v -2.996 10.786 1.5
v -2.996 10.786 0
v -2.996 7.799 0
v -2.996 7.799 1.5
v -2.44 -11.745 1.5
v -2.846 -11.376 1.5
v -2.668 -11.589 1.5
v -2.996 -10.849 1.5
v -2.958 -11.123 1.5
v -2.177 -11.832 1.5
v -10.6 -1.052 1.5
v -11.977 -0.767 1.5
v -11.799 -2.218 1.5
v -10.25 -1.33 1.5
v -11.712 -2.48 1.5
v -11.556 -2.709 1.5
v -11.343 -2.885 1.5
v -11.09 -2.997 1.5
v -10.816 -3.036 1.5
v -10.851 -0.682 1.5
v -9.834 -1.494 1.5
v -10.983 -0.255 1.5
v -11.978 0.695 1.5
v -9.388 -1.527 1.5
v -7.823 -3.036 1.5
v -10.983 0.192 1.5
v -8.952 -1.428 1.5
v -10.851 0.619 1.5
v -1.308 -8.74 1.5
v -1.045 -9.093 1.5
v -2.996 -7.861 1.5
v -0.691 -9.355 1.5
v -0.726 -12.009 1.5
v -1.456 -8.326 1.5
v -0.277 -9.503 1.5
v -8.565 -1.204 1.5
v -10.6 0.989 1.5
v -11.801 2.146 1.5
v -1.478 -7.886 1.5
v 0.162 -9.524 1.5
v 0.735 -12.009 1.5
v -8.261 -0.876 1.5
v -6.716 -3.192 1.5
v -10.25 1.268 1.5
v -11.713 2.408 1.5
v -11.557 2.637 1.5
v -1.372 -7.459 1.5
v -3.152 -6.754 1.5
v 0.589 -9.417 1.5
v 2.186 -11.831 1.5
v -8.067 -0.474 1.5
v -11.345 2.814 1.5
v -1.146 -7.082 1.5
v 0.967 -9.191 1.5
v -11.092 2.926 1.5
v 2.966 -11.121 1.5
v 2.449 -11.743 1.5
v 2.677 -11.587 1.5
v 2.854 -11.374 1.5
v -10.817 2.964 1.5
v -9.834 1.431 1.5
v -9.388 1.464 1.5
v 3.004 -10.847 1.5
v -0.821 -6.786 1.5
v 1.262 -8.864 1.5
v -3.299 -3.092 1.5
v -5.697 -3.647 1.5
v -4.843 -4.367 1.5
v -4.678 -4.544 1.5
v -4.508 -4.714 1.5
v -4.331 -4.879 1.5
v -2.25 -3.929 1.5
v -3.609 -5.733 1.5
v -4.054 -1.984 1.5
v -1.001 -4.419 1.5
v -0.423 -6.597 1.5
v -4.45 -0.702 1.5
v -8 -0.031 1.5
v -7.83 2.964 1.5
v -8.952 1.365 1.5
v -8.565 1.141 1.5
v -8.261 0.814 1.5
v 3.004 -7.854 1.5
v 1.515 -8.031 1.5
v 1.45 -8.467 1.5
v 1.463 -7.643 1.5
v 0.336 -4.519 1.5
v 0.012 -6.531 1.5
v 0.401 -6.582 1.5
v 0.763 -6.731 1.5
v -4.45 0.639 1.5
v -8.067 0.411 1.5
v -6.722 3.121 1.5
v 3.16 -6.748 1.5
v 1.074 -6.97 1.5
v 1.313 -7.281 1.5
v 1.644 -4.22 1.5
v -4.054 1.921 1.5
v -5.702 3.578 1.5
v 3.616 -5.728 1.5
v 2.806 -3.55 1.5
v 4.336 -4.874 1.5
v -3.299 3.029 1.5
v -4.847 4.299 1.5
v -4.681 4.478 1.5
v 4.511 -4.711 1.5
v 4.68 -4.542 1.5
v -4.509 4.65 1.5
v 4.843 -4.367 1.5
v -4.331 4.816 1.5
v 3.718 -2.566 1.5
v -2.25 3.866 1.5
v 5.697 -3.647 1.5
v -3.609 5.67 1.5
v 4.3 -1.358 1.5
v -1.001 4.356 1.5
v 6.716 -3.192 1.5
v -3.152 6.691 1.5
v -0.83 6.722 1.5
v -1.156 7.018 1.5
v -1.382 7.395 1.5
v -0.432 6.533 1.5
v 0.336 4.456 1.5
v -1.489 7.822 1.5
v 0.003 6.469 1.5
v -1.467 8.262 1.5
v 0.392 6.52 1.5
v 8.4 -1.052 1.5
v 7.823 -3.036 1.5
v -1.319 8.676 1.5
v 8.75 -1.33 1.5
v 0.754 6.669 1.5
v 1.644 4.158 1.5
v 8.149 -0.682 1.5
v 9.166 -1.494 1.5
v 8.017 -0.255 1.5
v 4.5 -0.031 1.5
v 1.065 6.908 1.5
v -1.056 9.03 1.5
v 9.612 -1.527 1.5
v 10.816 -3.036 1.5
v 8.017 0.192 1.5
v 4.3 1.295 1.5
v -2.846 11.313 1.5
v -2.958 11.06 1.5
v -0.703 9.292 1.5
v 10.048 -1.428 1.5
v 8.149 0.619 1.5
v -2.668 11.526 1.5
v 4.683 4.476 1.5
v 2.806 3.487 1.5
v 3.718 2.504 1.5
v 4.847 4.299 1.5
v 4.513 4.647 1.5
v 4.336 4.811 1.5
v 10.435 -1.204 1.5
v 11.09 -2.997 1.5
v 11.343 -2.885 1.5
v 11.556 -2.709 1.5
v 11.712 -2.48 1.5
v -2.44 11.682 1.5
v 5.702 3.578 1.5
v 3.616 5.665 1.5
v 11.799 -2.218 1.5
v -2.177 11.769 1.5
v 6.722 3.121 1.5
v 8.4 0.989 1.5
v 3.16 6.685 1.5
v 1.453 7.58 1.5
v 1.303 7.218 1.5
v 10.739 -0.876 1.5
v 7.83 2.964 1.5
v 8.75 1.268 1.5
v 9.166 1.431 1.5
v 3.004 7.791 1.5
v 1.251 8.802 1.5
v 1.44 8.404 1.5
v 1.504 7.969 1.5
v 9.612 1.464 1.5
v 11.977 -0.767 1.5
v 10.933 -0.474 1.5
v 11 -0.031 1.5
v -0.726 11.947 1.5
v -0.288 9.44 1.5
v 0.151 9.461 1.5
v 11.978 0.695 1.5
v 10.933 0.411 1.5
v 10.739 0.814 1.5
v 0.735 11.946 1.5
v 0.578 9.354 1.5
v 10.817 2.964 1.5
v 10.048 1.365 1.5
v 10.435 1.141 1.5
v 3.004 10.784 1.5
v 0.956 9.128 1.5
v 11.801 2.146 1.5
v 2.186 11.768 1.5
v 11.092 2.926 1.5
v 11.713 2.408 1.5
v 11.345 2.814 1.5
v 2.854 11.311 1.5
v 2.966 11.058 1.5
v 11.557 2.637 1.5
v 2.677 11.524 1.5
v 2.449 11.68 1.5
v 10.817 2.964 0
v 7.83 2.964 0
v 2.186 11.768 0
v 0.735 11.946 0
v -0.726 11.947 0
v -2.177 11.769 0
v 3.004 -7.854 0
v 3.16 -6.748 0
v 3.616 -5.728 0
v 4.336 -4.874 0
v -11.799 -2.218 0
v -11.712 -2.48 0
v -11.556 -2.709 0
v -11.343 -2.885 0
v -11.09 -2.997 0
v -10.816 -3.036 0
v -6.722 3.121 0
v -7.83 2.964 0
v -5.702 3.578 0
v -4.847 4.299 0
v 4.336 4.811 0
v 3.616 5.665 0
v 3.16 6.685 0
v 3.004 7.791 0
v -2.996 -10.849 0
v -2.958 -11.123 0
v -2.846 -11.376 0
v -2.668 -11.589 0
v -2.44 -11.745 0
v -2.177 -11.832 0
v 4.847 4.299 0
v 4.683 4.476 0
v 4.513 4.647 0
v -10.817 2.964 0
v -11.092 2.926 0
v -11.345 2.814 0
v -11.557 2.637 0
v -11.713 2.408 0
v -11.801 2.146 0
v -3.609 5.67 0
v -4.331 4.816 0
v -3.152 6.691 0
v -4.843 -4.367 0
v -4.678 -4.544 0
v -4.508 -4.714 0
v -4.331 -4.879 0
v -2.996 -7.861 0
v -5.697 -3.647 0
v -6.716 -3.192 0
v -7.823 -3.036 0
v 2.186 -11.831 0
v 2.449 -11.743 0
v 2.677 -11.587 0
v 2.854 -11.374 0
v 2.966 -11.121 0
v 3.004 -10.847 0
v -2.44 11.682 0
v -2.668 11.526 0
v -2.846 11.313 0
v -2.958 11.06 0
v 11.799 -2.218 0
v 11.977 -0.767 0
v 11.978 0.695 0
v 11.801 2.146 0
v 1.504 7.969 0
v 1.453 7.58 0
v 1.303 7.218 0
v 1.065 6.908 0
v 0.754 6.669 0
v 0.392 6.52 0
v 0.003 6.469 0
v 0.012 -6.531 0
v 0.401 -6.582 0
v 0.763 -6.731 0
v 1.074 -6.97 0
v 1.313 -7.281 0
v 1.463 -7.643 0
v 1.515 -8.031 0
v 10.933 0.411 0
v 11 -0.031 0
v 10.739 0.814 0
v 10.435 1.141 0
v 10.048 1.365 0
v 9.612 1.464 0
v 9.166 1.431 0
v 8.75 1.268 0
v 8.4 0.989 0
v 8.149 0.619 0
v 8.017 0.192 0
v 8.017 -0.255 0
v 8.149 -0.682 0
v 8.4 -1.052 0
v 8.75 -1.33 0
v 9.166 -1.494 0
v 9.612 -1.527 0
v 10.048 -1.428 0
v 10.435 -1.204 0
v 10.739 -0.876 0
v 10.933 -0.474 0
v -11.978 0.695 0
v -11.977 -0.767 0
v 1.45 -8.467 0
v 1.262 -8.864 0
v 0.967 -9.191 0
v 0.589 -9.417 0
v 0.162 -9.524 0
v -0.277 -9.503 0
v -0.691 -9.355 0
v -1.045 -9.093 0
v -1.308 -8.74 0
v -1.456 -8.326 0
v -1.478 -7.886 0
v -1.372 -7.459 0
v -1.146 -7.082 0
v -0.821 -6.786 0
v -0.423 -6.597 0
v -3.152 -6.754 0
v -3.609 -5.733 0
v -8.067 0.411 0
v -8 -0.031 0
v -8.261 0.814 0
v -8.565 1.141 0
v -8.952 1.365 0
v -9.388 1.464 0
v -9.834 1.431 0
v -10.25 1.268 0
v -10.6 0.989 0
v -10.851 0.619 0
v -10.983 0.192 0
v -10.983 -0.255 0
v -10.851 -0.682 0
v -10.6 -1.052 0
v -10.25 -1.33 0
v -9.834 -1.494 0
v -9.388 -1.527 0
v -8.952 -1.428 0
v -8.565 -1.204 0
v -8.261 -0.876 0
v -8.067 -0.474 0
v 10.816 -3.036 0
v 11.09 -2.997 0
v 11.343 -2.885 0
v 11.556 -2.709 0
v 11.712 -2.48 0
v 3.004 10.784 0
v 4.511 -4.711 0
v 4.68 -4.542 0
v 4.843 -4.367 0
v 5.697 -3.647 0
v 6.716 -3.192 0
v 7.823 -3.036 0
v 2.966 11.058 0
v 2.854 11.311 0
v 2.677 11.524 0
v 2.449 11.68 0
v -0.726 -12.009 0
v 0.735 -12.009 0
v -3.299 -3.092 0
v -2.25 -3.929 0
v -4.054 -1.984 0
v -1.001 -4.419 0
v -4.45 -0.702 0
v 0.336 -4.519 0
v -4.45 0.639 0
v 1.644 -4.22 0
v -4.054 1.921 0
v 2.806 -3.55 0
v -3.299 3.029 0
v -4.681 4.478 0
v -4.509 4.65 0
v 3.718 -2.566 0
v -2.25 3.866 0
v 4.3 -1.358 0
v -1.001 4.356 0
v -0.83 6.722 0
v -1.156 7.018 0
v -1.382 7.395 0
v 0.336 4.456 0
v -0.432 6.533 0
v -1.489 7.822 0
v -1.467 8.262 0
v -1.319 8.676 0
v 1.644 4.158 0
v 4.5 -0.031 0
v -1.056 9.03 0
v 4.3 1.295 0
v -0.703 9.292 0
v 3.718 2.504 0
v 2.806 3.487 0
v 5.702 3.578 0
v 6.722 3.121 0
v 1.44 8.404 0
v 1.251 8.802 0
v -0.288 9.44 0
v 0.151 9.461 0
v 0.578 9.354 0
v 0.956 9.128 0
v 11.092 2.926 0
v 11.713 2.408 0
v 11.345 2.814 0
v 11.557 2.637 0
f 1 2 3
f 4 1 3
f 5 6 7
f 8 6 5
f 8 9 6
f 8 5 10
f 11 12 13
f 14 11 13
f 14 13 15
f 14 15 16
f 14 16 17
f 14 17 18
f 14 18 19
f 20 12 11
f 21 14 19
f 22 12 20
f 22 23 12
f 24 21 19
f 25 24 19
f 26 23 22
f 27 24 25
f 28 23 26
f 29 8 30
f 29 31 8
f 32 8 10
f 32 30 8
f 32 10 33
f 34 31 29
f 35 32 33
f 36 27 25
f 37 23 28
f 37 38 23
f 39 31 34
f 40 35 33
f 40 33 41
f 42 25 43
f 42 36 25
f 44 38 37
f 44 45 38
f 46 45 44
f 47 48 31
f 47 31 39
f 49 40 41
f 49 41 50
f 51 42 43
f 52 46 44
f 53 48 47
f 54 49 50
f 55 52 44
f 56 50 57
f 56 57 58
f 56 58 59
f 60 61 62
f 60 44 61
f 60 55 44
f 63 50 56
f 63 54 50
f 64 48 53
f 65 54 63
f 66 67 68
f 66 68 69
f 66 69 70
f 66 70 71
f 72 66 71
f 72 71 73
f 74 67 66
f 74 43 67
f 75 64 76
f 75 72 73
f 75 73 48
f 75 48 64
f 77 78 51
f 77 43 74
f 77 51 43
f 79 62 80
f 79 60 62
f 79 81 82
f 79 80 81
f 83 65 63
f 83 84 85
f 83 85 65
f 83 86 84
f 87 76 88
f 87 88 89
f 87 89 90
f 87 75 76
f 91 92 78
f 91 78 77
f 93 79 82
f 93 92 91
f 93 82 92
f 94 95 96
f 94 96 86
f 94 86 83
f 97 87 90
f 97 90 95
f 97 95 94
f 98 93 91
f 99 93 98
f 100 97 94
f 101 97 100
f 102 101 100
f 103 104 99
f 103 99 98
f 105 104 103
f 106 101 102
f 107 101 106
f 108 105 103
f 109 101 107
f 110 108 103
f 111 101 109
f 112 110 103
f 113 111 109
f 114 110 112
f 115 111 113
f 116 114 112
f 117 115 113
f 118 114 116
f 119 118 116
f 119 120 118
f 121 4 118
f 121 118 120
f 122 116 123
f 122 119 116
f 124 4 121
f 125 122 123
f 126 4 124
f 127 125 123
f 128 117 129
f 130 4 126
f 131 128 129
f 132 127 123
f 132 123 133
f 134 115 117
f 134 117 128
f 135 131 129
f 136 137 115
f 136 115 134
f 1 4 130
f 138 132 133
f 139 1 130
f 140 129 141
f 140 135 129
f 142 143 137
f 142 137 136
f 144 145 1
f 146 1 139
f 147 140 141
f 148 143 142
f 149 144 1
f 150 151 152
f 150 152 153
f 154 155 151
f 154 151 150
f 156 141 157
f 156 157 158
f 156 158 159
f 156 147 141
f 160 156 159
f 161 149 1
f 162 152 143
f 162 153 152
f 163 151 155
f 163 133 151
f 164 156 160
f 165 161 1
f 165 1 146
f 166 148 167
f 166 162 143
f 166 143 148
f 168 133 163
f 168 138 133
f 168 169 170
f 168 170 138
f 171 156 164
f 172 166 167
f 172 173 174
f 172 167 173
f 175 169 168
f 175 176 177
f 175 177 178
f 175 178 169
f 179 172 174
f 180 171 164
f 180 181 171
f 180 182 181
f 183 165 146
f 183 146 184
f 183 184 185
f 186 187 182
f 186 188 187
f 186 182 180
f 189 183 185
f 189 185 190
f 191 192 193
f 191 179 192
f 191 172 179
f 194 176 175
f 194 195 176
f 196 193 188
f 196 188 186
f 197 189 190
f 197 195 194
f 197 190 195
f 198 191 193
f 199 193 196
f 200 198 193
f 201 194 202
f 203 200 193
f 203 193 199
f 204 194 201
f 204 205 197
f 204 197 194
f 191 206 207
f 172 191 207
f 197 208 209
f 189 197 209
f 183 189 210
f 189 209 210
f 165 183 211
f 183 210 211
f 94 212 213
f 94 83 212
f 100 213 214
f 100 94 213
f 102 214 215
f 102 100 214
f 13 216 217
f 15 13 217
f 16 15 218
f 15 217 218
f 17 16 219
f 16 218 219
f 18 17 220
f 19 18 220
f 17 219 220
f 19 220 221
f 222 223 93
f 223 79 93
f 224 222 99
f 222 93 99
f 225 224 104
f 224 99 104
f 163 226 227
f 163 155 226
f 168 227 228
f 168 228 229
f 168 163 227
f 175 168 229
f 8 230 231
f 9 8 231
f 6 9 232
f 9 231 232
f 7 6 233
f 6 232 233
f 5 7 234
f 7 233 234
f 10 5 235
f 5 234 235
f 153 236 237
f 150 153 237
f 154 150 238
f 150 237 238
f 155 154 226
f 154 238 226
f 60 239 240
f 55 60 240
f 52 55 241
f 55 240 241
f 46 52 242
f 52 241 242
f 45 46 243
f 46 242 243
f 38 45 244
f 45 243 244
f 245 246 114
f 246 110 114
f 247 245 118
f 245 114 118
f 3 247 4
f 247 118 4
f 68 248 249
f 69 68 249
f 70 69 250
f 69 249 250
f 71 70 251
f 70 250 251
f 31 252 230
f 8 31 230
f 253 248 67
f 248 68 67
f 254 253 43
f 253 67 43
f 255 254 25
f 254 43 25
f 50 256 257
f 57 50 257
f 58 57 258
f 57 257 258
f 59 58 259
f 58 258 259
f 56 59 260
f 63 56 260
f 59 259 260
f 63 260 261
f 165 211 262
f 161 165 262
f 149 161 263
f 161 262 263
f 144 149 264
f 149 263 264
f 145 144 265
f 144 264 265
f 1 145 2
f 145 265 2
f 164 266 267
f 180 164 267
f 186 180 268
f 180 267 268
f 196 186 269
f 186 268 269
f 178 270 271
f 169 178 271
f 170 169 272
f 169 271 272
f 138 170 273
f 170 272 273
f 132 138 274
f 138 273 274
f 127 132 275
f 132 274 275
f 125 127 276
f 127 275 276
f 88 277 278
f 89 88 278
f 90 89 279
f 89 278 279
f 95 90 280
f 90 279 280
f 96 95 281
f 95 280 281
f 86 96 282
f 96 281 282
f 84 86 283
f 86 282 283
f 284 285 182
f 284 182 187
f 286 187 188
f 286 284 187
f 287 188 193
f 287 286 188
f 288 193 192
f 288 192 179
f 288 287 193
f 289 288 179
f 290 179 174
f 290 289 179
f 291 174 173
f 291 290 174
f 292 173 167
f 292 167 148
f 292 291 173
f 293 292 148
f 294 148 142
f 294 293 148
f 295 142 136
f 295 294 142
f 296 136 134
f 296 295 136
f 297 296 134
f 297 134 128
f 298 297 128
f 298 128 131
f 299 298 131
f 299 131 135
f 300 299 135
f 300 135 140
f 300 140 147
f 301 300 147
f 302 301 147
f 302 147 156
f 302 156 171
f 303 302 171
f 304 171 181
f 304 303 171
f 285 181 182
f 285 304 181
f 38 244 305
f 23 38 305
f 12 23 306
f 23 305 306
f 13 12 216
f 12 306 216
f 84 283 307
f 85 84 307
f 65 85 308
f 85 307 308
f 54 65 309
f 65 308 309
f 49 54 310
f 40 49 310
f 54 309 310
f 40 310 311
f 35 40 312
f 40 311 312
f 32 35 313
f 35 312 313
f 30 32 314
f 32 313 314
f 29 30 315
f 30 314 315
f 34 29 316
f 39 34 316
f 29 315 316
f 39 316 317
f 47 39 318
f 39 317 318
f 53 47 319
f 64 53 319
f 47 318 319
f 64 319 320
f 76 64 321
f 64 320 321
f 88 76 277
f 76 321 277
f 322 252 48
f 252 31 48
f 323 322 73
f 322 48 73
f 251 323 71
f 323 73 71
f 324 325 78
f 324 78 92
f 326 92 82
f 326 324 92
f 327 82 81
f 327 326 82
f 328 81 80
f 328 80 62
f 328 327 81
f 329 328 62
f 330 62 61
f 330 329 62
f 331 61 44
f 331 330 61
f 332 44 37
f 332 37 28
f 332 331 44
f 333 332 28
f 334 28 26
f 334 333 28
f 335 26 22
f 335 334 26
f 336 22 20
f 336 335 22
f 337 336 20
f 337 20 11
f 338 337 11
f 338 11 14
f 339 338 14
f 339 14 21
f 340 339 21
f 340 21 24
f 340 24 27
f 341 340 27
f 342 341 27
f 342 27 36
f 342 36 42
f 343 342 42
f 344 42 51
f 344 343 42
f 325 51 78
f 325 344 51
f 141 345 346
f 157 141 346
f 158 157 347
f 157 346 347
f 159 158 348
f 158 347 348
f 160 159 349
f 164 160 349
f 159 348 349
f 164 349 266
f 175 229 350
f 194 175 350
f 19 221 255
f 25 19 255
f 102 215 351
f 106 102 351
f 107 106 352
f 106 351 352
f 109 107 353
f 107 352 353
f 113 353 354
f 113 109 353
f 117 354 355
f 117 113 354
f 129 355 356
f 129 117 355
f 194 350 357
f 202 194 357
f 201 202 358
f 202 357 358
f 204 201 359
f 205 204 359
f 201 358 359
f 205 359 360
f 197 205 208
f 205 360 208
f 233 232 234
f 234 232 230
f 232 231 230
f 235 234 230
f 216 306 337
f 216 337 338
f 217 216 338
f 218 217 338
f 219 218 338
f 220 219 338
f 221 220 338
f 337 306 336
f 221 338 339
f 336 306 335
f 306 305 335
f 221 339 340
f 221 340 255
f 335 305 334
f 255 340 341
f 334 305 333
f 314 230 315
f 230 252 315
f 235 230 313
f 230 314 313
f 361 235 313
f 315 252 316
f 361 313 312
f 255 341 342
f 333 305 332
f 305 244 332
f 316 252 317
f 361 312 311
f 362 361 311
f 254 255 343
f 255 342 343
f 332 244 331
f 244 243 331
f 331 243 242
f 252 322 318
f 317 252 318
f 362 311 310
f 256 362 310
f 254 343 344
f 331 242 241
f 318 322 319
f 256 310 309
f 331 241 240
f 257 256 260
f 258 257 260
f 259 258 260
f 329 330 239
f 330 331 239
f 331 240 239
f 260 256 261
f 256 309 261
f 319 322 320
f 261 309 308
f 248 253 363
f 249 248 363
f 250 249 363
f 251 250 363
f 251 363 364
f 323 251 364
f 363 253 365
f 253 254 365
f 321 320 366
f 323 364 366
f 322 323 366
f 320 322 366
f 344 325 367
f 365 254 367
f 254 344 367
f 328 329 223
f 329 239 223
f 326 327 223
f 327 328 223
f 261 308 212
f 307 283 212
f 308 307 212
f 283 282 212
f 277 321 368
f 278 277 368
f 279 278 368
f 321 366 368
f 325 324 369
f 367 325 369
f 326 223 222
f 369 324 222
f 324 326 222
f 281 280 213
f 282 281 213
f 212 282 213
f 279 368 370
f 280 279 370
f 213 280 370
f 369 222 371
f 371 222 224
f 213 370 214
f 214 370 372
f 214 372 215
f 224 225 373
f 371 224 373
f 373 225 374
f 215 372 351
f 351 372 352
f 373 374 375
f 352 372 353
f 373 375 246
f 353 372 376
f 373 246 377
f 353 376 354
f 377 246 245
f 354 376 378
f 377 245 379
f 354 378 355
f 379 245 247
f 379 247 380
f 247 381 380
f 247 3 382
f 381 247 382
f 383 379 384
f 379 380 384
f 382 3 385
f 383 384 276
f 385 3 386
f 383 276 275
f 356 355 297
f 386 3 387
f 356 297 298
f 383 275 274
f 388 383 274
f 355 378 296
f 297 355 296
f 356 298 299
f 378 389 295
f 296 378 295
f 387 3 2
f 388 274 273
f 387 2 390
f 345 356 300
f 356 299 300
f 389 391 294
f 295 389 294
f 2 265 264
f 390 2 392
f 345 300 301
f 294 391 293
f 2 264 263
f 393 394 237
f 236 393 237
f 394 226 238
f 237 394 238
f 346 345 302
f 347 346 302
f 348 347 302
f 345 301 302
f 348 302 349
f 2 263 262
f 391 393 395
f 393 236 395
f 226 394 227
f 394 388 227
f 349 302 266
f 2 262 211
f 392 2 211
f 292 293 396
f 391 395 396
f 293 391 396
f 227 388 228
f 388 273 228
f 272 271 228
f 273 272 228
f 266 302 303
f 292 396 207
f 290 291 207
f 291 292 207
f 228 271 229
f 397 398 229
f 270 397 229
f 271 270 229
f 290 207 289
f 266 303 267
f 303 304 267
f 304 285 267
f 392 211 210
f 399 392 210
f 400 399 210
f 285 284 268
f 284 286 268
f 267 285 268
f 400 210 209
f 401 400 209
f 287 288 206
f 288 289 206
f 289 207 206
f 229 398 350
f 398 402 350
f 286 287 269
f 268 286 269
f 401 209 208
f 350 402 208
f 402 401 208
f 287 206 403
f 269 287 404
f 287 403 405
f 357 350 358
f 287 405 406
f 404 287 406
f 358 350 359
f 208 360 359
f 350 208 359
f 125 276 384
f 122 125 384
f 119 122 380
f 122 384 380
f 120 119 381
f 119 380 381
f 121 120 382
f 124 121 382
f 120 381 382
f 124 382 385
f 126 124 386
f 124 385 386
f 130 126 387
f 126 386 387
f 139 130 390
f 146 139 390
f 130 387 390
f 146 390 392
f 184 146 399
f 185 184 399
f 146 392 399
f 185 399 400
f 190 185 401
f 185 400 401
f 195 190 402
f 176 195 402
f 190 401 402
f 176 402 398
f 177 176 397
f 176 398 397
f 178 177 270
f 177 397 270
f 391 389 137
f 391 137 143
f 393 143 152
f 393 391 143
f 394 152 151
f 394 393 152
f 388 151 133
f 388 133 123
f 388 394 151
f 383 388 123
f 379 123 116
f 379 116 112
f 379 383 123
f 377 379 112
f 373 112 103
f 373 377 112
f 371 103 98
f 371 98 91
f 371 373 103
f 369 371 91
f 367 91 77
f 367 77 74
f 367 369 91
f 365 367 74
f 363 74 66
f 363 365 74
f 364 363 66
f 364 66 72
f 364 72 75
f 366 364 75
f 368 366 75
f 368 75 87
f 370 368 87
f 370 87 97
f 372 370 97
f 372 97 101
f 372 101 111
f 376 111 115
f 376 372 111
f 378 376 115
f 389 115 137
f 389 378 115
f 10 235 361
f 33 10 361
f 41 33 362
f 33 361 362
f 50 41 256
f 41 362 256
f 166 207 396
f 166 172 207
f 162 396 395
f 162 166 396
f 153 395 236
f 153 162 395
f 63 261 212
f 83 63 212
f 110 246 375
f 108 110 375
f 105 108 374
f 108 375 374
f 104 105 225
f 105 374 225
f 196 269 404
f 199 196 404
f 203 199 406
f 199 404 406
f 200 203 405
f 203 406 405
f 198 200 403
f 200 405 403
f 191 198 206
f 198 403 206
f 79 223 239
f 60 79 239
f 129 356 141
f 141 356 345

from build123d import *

# Parameters (mm, degrees)
F0_R     = 4.5
F0_R_2   = 1.5
F1_DEPTH = 1.5
F2_R     = 4


with BuildPart() as f1:
    # F0 (on Top) → F1 (new body)
    with BuildSketch(Plane.XY):
        with BuildLine():
            ThreePointArc((3.004161691, -5.7955113904), (1.5522577141, -6.3433300134), (0.0118794416, -6.5313863328))
            ThreePointArc((0.0118794416, -6.5313863328), (-1.5361614481, -6.3472667251), (-2.995838309, -5.7998417643))
            Line((-2.995838309, -5.7998417643), (-2.995838309, -10.8488196837))
            ThreePointArc((-2.995838309, -10.8488196837), (-2.764421371, -11.4885696949), (-2.1772781553, -11.8322217287))
            ThreePointArc((-2.1772781553, -11.8322217287), (0.0046169816, -12.0313963001), (2.1863582083, -11.8305428262))
            ThreePointArc((2.1863582083, -11.8305428262), (2.7729908389, -11.4867349425), (3.004161691, -10.8472806897))
            Line((3.004161691, -10.8472806897), (3.004161691, -5.7955113904))
        make_face()
        with BuildLine():
            ThreePointArc((0.0118794416, -6.5313863328), (1.0743113125, -6.9697548816), (1.5146208008, -8.0313838278))
            ThreePointArc((1.5146208008, -8.0313838278), (-1.0450697109, -9.093012774), (0.0118794416, -6.5313863328))
        make_face(mode=Mode.SUBTRACT)
        with BuildLine():
            ThreePointArc((-2.995838309, -5.7998417643), (-1.5361614481, -6.3472667251), (0.0118794416, -6.5313863328))
            ThreePointArc((0.0118794416, -6.5313863328), (1.5522577141, -6.3433300134), (3.004161691, -5.7955113904))
            ThreePointArc((3.004161691, -5.7955113904), (4.5961940777, -4.627591266), (5.7641142021, -3.0355588793))
            ThreePointArc((5.7641142021, -3.0355588793), (6.3133486484, -1.5778863875), (6.5, -0.0313971883))
            ThreePointArc((6.5, -0.0313971883), (6.3144631499, 1.5105350826), (5.768444576, 2.9644411207))
            ThreePointArc((5.768444576, 2.9644411207), (4.5995100863, 4.5614784867), (3.004161691, 5.7327170138))
            ThreePointArc((3.004161691, 5.7327170138), (1.5481312977, 6.2815489928), (0.0033814005, 6.4686019322))
            ThreePointArc((0.0033814005, 6.4686019322), (-1.540289778, 6.2834668165), (-2.995838309, 5.7370473877))
            ThreePointArc((-2.995838309, 5.7370473877), (-4.5961940777, 4.5647968894), (-5.768444576, 2.9644411207))
            ThreePointArc((-5.768444576, 2.9644411207), (-6.4999983071, -0.0360884255), (-5.7641142021, -3.0355588793))
            ThreePointArc((-5.7641142021, -3.0355588793), (-4.592875675, -4.6309072746), (-2.995838309, -5.7998417643))
        make_face()
        with Locations((0, -0.0313971883)):
            Circle(F0_R, mode=Mode.SUBTRACT)
        with BuildLine():
            Line((-10.8158835014, -3.0355588793), (-5.7641142021, -3.0355588793))
            ThreePointArc((-5.7641142021, -3.0355588793), (-6.4999983071, -0.0360884255), (-5.768444576, 2.9644411207))
            Line((-5.768444576, 2.9644411207), (-10.8174224954, 2.9644411207))
            ThreePointArc((-10.8174224954, 2.9644411207), (-11.4571725066, 2.7330241827), (-11.8008245404, 2.145880967))
            ThreePointArc((-11.8008245404, 2.145880967), (-11.9999991118, -0.0360141699), (-11.7991456379, -2.2177553966))
            ThreePointArc((-11.7991456379, -2.2177553966), (-11.4553377541, -2.8043880272), (-10.8158835014, -3.0355588793))
        make_face()
        with Locations((-9.5, -0.0313971883)):
            Circle(F0_R_2, mode=Mode.SUBTRACT)
        with BuildLine():
            ThreePointArc((6.5, -0.0313971883), (6.3133486484, -1.5778863875), (5.7641142021, -3.0355588793))
            Line((5.7641142021, -3.0355588793), (10.8158835014, -3.0355588793))
            ThreePointArc((10.8158835014, -3.0355588793), (11.4553377541, -2.8043880272), (11.7991456379, -2.2177553966))
            ThreePointArc((11.7991456379, -2.2177553966), (11.9999991118, -0.0360141699), (11.8008245404, 2.145880967))
            ThreePointArc((11.8008245404, 2.145880967), (11.4571725066, 2.7330241827), (10.8174224954, 2.9644411207))
            Line((10.8174224954, 2.9644411207), (5.768444576, 2.9644411207))
            ThreePointArc((5.768444576, 2.9644411207), (6.3144631499, 1.5105350826), (6.5, -0.0313971883))
        make_face()
        with Locations((9.5, -0.0313971883)):
            Circle(F0_R_2, mode=Mode.SUBTRACT)
        with BuildLine():
            Line((-2.995838309, 10.7860253071), (-2.995838309, 5.7370473877))
            ThreePointArc((-2.995838309, 5.7370473877), (-1.540289778, 6.2834668165), (0.0033814005, 6.4686019322))
            ThreePointArc((0.0033814005, 6.4686019322), (1.5481312977, 6.2815489928), (3.004161691, 5.7327170138))
            Line((3.004161691, 5.7327170138), (3.004161691, 10.7844863131))
            ThreePointArc((3.004161691, 10.7844863131), (2.7729908389, 11.4239405658), (2.1863582083, 11.7677484496))
            ThreePointArc((2.1863582083, 11.7677484496), (0.0046169816, 11.9686019235), (-2.1772781553, 11.7694273521))
            ThreePointArc((-2.1772781553, 11.7694273521), (-2.764421371, 11.4257753183), (-2.995838309, 10.7860253071))
        make_face()
        with BuildLine():
            ThreePointArc((1.504161691, 7.9686017292), (1.0645459525, 6.907665719), (0.0033814005, 6.4686019322))
            ThreePointArc((0.0033814005, 6.4686019322), (-1.0562225706, 9.0295377395), (1.504161691, 7.9686017292))
        make_face(mode=Mode.SUBTRACT)
    extrude(amount=F1_DEPTH)

    # F2
    f2_edges = [f1.edges().sort_by_distance(p)[0] for p in [
        (-5.764114, -3.035559, 0.75),
        (-2.995838, -5.799842, 0.75),
        (3.004162, 5.732717, 0.75),
        (5.768445, 2.964441, 0.75),
        (5.764114, -3.035559, 0.75),
        (3.004162, -5.795511, 0.75),
        (-2.995838, 5.737047, 0.75),
        (-5.768445, 2.964441, 0.75),
    ]]
    fillet(f2_edges, radius=F2_R)


solid = f1.part
